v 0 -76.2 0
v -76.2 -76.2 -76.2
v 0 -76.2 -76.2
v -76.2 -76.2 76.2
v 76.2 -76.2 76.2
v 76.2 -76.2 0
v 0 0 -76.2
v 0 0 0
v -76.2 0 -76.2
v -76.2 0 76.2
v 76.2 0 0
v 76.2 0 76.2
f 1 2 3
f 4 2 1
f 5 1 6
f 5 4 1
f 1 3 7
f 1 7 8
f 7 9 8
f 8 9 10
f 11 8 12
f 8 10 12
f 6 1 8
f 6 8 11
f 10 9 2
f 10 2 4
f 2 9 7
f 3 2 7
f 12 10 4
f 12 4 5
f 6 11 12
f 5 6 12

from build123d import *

# Parameters (mm, degrees)
F1_W     = 152.4
F1_H     = 152.4
F2_DEPTH = 76.2
F3_W     = 76.2
F3_H     = 76.2
F4_DEPTH = 76.201


# Not quite as in the source:
# - a variable given as a bare number and used for a length is read in inches; the dataset says mm whatever the document's units were


with BuildPart() as f2:
    # F1 (on Front) → F2 (new body)
    with BuildSketch(Plane.XZ):
        Rectangle(F1_W, F1_H)
    extrude(amount=F2_DEPTH)

    # F3 (on face) → F4 (cut, through all)
    with BuildSketch(Plane.XZ.offset(76.2)):
        with Locations((38.1, -38.1)):
            Rectangle(F3_W, F3_H)
    extrude(amount=-F4_DEPTH, mode=Mode.SUBTRACT)


solid = f2.part
